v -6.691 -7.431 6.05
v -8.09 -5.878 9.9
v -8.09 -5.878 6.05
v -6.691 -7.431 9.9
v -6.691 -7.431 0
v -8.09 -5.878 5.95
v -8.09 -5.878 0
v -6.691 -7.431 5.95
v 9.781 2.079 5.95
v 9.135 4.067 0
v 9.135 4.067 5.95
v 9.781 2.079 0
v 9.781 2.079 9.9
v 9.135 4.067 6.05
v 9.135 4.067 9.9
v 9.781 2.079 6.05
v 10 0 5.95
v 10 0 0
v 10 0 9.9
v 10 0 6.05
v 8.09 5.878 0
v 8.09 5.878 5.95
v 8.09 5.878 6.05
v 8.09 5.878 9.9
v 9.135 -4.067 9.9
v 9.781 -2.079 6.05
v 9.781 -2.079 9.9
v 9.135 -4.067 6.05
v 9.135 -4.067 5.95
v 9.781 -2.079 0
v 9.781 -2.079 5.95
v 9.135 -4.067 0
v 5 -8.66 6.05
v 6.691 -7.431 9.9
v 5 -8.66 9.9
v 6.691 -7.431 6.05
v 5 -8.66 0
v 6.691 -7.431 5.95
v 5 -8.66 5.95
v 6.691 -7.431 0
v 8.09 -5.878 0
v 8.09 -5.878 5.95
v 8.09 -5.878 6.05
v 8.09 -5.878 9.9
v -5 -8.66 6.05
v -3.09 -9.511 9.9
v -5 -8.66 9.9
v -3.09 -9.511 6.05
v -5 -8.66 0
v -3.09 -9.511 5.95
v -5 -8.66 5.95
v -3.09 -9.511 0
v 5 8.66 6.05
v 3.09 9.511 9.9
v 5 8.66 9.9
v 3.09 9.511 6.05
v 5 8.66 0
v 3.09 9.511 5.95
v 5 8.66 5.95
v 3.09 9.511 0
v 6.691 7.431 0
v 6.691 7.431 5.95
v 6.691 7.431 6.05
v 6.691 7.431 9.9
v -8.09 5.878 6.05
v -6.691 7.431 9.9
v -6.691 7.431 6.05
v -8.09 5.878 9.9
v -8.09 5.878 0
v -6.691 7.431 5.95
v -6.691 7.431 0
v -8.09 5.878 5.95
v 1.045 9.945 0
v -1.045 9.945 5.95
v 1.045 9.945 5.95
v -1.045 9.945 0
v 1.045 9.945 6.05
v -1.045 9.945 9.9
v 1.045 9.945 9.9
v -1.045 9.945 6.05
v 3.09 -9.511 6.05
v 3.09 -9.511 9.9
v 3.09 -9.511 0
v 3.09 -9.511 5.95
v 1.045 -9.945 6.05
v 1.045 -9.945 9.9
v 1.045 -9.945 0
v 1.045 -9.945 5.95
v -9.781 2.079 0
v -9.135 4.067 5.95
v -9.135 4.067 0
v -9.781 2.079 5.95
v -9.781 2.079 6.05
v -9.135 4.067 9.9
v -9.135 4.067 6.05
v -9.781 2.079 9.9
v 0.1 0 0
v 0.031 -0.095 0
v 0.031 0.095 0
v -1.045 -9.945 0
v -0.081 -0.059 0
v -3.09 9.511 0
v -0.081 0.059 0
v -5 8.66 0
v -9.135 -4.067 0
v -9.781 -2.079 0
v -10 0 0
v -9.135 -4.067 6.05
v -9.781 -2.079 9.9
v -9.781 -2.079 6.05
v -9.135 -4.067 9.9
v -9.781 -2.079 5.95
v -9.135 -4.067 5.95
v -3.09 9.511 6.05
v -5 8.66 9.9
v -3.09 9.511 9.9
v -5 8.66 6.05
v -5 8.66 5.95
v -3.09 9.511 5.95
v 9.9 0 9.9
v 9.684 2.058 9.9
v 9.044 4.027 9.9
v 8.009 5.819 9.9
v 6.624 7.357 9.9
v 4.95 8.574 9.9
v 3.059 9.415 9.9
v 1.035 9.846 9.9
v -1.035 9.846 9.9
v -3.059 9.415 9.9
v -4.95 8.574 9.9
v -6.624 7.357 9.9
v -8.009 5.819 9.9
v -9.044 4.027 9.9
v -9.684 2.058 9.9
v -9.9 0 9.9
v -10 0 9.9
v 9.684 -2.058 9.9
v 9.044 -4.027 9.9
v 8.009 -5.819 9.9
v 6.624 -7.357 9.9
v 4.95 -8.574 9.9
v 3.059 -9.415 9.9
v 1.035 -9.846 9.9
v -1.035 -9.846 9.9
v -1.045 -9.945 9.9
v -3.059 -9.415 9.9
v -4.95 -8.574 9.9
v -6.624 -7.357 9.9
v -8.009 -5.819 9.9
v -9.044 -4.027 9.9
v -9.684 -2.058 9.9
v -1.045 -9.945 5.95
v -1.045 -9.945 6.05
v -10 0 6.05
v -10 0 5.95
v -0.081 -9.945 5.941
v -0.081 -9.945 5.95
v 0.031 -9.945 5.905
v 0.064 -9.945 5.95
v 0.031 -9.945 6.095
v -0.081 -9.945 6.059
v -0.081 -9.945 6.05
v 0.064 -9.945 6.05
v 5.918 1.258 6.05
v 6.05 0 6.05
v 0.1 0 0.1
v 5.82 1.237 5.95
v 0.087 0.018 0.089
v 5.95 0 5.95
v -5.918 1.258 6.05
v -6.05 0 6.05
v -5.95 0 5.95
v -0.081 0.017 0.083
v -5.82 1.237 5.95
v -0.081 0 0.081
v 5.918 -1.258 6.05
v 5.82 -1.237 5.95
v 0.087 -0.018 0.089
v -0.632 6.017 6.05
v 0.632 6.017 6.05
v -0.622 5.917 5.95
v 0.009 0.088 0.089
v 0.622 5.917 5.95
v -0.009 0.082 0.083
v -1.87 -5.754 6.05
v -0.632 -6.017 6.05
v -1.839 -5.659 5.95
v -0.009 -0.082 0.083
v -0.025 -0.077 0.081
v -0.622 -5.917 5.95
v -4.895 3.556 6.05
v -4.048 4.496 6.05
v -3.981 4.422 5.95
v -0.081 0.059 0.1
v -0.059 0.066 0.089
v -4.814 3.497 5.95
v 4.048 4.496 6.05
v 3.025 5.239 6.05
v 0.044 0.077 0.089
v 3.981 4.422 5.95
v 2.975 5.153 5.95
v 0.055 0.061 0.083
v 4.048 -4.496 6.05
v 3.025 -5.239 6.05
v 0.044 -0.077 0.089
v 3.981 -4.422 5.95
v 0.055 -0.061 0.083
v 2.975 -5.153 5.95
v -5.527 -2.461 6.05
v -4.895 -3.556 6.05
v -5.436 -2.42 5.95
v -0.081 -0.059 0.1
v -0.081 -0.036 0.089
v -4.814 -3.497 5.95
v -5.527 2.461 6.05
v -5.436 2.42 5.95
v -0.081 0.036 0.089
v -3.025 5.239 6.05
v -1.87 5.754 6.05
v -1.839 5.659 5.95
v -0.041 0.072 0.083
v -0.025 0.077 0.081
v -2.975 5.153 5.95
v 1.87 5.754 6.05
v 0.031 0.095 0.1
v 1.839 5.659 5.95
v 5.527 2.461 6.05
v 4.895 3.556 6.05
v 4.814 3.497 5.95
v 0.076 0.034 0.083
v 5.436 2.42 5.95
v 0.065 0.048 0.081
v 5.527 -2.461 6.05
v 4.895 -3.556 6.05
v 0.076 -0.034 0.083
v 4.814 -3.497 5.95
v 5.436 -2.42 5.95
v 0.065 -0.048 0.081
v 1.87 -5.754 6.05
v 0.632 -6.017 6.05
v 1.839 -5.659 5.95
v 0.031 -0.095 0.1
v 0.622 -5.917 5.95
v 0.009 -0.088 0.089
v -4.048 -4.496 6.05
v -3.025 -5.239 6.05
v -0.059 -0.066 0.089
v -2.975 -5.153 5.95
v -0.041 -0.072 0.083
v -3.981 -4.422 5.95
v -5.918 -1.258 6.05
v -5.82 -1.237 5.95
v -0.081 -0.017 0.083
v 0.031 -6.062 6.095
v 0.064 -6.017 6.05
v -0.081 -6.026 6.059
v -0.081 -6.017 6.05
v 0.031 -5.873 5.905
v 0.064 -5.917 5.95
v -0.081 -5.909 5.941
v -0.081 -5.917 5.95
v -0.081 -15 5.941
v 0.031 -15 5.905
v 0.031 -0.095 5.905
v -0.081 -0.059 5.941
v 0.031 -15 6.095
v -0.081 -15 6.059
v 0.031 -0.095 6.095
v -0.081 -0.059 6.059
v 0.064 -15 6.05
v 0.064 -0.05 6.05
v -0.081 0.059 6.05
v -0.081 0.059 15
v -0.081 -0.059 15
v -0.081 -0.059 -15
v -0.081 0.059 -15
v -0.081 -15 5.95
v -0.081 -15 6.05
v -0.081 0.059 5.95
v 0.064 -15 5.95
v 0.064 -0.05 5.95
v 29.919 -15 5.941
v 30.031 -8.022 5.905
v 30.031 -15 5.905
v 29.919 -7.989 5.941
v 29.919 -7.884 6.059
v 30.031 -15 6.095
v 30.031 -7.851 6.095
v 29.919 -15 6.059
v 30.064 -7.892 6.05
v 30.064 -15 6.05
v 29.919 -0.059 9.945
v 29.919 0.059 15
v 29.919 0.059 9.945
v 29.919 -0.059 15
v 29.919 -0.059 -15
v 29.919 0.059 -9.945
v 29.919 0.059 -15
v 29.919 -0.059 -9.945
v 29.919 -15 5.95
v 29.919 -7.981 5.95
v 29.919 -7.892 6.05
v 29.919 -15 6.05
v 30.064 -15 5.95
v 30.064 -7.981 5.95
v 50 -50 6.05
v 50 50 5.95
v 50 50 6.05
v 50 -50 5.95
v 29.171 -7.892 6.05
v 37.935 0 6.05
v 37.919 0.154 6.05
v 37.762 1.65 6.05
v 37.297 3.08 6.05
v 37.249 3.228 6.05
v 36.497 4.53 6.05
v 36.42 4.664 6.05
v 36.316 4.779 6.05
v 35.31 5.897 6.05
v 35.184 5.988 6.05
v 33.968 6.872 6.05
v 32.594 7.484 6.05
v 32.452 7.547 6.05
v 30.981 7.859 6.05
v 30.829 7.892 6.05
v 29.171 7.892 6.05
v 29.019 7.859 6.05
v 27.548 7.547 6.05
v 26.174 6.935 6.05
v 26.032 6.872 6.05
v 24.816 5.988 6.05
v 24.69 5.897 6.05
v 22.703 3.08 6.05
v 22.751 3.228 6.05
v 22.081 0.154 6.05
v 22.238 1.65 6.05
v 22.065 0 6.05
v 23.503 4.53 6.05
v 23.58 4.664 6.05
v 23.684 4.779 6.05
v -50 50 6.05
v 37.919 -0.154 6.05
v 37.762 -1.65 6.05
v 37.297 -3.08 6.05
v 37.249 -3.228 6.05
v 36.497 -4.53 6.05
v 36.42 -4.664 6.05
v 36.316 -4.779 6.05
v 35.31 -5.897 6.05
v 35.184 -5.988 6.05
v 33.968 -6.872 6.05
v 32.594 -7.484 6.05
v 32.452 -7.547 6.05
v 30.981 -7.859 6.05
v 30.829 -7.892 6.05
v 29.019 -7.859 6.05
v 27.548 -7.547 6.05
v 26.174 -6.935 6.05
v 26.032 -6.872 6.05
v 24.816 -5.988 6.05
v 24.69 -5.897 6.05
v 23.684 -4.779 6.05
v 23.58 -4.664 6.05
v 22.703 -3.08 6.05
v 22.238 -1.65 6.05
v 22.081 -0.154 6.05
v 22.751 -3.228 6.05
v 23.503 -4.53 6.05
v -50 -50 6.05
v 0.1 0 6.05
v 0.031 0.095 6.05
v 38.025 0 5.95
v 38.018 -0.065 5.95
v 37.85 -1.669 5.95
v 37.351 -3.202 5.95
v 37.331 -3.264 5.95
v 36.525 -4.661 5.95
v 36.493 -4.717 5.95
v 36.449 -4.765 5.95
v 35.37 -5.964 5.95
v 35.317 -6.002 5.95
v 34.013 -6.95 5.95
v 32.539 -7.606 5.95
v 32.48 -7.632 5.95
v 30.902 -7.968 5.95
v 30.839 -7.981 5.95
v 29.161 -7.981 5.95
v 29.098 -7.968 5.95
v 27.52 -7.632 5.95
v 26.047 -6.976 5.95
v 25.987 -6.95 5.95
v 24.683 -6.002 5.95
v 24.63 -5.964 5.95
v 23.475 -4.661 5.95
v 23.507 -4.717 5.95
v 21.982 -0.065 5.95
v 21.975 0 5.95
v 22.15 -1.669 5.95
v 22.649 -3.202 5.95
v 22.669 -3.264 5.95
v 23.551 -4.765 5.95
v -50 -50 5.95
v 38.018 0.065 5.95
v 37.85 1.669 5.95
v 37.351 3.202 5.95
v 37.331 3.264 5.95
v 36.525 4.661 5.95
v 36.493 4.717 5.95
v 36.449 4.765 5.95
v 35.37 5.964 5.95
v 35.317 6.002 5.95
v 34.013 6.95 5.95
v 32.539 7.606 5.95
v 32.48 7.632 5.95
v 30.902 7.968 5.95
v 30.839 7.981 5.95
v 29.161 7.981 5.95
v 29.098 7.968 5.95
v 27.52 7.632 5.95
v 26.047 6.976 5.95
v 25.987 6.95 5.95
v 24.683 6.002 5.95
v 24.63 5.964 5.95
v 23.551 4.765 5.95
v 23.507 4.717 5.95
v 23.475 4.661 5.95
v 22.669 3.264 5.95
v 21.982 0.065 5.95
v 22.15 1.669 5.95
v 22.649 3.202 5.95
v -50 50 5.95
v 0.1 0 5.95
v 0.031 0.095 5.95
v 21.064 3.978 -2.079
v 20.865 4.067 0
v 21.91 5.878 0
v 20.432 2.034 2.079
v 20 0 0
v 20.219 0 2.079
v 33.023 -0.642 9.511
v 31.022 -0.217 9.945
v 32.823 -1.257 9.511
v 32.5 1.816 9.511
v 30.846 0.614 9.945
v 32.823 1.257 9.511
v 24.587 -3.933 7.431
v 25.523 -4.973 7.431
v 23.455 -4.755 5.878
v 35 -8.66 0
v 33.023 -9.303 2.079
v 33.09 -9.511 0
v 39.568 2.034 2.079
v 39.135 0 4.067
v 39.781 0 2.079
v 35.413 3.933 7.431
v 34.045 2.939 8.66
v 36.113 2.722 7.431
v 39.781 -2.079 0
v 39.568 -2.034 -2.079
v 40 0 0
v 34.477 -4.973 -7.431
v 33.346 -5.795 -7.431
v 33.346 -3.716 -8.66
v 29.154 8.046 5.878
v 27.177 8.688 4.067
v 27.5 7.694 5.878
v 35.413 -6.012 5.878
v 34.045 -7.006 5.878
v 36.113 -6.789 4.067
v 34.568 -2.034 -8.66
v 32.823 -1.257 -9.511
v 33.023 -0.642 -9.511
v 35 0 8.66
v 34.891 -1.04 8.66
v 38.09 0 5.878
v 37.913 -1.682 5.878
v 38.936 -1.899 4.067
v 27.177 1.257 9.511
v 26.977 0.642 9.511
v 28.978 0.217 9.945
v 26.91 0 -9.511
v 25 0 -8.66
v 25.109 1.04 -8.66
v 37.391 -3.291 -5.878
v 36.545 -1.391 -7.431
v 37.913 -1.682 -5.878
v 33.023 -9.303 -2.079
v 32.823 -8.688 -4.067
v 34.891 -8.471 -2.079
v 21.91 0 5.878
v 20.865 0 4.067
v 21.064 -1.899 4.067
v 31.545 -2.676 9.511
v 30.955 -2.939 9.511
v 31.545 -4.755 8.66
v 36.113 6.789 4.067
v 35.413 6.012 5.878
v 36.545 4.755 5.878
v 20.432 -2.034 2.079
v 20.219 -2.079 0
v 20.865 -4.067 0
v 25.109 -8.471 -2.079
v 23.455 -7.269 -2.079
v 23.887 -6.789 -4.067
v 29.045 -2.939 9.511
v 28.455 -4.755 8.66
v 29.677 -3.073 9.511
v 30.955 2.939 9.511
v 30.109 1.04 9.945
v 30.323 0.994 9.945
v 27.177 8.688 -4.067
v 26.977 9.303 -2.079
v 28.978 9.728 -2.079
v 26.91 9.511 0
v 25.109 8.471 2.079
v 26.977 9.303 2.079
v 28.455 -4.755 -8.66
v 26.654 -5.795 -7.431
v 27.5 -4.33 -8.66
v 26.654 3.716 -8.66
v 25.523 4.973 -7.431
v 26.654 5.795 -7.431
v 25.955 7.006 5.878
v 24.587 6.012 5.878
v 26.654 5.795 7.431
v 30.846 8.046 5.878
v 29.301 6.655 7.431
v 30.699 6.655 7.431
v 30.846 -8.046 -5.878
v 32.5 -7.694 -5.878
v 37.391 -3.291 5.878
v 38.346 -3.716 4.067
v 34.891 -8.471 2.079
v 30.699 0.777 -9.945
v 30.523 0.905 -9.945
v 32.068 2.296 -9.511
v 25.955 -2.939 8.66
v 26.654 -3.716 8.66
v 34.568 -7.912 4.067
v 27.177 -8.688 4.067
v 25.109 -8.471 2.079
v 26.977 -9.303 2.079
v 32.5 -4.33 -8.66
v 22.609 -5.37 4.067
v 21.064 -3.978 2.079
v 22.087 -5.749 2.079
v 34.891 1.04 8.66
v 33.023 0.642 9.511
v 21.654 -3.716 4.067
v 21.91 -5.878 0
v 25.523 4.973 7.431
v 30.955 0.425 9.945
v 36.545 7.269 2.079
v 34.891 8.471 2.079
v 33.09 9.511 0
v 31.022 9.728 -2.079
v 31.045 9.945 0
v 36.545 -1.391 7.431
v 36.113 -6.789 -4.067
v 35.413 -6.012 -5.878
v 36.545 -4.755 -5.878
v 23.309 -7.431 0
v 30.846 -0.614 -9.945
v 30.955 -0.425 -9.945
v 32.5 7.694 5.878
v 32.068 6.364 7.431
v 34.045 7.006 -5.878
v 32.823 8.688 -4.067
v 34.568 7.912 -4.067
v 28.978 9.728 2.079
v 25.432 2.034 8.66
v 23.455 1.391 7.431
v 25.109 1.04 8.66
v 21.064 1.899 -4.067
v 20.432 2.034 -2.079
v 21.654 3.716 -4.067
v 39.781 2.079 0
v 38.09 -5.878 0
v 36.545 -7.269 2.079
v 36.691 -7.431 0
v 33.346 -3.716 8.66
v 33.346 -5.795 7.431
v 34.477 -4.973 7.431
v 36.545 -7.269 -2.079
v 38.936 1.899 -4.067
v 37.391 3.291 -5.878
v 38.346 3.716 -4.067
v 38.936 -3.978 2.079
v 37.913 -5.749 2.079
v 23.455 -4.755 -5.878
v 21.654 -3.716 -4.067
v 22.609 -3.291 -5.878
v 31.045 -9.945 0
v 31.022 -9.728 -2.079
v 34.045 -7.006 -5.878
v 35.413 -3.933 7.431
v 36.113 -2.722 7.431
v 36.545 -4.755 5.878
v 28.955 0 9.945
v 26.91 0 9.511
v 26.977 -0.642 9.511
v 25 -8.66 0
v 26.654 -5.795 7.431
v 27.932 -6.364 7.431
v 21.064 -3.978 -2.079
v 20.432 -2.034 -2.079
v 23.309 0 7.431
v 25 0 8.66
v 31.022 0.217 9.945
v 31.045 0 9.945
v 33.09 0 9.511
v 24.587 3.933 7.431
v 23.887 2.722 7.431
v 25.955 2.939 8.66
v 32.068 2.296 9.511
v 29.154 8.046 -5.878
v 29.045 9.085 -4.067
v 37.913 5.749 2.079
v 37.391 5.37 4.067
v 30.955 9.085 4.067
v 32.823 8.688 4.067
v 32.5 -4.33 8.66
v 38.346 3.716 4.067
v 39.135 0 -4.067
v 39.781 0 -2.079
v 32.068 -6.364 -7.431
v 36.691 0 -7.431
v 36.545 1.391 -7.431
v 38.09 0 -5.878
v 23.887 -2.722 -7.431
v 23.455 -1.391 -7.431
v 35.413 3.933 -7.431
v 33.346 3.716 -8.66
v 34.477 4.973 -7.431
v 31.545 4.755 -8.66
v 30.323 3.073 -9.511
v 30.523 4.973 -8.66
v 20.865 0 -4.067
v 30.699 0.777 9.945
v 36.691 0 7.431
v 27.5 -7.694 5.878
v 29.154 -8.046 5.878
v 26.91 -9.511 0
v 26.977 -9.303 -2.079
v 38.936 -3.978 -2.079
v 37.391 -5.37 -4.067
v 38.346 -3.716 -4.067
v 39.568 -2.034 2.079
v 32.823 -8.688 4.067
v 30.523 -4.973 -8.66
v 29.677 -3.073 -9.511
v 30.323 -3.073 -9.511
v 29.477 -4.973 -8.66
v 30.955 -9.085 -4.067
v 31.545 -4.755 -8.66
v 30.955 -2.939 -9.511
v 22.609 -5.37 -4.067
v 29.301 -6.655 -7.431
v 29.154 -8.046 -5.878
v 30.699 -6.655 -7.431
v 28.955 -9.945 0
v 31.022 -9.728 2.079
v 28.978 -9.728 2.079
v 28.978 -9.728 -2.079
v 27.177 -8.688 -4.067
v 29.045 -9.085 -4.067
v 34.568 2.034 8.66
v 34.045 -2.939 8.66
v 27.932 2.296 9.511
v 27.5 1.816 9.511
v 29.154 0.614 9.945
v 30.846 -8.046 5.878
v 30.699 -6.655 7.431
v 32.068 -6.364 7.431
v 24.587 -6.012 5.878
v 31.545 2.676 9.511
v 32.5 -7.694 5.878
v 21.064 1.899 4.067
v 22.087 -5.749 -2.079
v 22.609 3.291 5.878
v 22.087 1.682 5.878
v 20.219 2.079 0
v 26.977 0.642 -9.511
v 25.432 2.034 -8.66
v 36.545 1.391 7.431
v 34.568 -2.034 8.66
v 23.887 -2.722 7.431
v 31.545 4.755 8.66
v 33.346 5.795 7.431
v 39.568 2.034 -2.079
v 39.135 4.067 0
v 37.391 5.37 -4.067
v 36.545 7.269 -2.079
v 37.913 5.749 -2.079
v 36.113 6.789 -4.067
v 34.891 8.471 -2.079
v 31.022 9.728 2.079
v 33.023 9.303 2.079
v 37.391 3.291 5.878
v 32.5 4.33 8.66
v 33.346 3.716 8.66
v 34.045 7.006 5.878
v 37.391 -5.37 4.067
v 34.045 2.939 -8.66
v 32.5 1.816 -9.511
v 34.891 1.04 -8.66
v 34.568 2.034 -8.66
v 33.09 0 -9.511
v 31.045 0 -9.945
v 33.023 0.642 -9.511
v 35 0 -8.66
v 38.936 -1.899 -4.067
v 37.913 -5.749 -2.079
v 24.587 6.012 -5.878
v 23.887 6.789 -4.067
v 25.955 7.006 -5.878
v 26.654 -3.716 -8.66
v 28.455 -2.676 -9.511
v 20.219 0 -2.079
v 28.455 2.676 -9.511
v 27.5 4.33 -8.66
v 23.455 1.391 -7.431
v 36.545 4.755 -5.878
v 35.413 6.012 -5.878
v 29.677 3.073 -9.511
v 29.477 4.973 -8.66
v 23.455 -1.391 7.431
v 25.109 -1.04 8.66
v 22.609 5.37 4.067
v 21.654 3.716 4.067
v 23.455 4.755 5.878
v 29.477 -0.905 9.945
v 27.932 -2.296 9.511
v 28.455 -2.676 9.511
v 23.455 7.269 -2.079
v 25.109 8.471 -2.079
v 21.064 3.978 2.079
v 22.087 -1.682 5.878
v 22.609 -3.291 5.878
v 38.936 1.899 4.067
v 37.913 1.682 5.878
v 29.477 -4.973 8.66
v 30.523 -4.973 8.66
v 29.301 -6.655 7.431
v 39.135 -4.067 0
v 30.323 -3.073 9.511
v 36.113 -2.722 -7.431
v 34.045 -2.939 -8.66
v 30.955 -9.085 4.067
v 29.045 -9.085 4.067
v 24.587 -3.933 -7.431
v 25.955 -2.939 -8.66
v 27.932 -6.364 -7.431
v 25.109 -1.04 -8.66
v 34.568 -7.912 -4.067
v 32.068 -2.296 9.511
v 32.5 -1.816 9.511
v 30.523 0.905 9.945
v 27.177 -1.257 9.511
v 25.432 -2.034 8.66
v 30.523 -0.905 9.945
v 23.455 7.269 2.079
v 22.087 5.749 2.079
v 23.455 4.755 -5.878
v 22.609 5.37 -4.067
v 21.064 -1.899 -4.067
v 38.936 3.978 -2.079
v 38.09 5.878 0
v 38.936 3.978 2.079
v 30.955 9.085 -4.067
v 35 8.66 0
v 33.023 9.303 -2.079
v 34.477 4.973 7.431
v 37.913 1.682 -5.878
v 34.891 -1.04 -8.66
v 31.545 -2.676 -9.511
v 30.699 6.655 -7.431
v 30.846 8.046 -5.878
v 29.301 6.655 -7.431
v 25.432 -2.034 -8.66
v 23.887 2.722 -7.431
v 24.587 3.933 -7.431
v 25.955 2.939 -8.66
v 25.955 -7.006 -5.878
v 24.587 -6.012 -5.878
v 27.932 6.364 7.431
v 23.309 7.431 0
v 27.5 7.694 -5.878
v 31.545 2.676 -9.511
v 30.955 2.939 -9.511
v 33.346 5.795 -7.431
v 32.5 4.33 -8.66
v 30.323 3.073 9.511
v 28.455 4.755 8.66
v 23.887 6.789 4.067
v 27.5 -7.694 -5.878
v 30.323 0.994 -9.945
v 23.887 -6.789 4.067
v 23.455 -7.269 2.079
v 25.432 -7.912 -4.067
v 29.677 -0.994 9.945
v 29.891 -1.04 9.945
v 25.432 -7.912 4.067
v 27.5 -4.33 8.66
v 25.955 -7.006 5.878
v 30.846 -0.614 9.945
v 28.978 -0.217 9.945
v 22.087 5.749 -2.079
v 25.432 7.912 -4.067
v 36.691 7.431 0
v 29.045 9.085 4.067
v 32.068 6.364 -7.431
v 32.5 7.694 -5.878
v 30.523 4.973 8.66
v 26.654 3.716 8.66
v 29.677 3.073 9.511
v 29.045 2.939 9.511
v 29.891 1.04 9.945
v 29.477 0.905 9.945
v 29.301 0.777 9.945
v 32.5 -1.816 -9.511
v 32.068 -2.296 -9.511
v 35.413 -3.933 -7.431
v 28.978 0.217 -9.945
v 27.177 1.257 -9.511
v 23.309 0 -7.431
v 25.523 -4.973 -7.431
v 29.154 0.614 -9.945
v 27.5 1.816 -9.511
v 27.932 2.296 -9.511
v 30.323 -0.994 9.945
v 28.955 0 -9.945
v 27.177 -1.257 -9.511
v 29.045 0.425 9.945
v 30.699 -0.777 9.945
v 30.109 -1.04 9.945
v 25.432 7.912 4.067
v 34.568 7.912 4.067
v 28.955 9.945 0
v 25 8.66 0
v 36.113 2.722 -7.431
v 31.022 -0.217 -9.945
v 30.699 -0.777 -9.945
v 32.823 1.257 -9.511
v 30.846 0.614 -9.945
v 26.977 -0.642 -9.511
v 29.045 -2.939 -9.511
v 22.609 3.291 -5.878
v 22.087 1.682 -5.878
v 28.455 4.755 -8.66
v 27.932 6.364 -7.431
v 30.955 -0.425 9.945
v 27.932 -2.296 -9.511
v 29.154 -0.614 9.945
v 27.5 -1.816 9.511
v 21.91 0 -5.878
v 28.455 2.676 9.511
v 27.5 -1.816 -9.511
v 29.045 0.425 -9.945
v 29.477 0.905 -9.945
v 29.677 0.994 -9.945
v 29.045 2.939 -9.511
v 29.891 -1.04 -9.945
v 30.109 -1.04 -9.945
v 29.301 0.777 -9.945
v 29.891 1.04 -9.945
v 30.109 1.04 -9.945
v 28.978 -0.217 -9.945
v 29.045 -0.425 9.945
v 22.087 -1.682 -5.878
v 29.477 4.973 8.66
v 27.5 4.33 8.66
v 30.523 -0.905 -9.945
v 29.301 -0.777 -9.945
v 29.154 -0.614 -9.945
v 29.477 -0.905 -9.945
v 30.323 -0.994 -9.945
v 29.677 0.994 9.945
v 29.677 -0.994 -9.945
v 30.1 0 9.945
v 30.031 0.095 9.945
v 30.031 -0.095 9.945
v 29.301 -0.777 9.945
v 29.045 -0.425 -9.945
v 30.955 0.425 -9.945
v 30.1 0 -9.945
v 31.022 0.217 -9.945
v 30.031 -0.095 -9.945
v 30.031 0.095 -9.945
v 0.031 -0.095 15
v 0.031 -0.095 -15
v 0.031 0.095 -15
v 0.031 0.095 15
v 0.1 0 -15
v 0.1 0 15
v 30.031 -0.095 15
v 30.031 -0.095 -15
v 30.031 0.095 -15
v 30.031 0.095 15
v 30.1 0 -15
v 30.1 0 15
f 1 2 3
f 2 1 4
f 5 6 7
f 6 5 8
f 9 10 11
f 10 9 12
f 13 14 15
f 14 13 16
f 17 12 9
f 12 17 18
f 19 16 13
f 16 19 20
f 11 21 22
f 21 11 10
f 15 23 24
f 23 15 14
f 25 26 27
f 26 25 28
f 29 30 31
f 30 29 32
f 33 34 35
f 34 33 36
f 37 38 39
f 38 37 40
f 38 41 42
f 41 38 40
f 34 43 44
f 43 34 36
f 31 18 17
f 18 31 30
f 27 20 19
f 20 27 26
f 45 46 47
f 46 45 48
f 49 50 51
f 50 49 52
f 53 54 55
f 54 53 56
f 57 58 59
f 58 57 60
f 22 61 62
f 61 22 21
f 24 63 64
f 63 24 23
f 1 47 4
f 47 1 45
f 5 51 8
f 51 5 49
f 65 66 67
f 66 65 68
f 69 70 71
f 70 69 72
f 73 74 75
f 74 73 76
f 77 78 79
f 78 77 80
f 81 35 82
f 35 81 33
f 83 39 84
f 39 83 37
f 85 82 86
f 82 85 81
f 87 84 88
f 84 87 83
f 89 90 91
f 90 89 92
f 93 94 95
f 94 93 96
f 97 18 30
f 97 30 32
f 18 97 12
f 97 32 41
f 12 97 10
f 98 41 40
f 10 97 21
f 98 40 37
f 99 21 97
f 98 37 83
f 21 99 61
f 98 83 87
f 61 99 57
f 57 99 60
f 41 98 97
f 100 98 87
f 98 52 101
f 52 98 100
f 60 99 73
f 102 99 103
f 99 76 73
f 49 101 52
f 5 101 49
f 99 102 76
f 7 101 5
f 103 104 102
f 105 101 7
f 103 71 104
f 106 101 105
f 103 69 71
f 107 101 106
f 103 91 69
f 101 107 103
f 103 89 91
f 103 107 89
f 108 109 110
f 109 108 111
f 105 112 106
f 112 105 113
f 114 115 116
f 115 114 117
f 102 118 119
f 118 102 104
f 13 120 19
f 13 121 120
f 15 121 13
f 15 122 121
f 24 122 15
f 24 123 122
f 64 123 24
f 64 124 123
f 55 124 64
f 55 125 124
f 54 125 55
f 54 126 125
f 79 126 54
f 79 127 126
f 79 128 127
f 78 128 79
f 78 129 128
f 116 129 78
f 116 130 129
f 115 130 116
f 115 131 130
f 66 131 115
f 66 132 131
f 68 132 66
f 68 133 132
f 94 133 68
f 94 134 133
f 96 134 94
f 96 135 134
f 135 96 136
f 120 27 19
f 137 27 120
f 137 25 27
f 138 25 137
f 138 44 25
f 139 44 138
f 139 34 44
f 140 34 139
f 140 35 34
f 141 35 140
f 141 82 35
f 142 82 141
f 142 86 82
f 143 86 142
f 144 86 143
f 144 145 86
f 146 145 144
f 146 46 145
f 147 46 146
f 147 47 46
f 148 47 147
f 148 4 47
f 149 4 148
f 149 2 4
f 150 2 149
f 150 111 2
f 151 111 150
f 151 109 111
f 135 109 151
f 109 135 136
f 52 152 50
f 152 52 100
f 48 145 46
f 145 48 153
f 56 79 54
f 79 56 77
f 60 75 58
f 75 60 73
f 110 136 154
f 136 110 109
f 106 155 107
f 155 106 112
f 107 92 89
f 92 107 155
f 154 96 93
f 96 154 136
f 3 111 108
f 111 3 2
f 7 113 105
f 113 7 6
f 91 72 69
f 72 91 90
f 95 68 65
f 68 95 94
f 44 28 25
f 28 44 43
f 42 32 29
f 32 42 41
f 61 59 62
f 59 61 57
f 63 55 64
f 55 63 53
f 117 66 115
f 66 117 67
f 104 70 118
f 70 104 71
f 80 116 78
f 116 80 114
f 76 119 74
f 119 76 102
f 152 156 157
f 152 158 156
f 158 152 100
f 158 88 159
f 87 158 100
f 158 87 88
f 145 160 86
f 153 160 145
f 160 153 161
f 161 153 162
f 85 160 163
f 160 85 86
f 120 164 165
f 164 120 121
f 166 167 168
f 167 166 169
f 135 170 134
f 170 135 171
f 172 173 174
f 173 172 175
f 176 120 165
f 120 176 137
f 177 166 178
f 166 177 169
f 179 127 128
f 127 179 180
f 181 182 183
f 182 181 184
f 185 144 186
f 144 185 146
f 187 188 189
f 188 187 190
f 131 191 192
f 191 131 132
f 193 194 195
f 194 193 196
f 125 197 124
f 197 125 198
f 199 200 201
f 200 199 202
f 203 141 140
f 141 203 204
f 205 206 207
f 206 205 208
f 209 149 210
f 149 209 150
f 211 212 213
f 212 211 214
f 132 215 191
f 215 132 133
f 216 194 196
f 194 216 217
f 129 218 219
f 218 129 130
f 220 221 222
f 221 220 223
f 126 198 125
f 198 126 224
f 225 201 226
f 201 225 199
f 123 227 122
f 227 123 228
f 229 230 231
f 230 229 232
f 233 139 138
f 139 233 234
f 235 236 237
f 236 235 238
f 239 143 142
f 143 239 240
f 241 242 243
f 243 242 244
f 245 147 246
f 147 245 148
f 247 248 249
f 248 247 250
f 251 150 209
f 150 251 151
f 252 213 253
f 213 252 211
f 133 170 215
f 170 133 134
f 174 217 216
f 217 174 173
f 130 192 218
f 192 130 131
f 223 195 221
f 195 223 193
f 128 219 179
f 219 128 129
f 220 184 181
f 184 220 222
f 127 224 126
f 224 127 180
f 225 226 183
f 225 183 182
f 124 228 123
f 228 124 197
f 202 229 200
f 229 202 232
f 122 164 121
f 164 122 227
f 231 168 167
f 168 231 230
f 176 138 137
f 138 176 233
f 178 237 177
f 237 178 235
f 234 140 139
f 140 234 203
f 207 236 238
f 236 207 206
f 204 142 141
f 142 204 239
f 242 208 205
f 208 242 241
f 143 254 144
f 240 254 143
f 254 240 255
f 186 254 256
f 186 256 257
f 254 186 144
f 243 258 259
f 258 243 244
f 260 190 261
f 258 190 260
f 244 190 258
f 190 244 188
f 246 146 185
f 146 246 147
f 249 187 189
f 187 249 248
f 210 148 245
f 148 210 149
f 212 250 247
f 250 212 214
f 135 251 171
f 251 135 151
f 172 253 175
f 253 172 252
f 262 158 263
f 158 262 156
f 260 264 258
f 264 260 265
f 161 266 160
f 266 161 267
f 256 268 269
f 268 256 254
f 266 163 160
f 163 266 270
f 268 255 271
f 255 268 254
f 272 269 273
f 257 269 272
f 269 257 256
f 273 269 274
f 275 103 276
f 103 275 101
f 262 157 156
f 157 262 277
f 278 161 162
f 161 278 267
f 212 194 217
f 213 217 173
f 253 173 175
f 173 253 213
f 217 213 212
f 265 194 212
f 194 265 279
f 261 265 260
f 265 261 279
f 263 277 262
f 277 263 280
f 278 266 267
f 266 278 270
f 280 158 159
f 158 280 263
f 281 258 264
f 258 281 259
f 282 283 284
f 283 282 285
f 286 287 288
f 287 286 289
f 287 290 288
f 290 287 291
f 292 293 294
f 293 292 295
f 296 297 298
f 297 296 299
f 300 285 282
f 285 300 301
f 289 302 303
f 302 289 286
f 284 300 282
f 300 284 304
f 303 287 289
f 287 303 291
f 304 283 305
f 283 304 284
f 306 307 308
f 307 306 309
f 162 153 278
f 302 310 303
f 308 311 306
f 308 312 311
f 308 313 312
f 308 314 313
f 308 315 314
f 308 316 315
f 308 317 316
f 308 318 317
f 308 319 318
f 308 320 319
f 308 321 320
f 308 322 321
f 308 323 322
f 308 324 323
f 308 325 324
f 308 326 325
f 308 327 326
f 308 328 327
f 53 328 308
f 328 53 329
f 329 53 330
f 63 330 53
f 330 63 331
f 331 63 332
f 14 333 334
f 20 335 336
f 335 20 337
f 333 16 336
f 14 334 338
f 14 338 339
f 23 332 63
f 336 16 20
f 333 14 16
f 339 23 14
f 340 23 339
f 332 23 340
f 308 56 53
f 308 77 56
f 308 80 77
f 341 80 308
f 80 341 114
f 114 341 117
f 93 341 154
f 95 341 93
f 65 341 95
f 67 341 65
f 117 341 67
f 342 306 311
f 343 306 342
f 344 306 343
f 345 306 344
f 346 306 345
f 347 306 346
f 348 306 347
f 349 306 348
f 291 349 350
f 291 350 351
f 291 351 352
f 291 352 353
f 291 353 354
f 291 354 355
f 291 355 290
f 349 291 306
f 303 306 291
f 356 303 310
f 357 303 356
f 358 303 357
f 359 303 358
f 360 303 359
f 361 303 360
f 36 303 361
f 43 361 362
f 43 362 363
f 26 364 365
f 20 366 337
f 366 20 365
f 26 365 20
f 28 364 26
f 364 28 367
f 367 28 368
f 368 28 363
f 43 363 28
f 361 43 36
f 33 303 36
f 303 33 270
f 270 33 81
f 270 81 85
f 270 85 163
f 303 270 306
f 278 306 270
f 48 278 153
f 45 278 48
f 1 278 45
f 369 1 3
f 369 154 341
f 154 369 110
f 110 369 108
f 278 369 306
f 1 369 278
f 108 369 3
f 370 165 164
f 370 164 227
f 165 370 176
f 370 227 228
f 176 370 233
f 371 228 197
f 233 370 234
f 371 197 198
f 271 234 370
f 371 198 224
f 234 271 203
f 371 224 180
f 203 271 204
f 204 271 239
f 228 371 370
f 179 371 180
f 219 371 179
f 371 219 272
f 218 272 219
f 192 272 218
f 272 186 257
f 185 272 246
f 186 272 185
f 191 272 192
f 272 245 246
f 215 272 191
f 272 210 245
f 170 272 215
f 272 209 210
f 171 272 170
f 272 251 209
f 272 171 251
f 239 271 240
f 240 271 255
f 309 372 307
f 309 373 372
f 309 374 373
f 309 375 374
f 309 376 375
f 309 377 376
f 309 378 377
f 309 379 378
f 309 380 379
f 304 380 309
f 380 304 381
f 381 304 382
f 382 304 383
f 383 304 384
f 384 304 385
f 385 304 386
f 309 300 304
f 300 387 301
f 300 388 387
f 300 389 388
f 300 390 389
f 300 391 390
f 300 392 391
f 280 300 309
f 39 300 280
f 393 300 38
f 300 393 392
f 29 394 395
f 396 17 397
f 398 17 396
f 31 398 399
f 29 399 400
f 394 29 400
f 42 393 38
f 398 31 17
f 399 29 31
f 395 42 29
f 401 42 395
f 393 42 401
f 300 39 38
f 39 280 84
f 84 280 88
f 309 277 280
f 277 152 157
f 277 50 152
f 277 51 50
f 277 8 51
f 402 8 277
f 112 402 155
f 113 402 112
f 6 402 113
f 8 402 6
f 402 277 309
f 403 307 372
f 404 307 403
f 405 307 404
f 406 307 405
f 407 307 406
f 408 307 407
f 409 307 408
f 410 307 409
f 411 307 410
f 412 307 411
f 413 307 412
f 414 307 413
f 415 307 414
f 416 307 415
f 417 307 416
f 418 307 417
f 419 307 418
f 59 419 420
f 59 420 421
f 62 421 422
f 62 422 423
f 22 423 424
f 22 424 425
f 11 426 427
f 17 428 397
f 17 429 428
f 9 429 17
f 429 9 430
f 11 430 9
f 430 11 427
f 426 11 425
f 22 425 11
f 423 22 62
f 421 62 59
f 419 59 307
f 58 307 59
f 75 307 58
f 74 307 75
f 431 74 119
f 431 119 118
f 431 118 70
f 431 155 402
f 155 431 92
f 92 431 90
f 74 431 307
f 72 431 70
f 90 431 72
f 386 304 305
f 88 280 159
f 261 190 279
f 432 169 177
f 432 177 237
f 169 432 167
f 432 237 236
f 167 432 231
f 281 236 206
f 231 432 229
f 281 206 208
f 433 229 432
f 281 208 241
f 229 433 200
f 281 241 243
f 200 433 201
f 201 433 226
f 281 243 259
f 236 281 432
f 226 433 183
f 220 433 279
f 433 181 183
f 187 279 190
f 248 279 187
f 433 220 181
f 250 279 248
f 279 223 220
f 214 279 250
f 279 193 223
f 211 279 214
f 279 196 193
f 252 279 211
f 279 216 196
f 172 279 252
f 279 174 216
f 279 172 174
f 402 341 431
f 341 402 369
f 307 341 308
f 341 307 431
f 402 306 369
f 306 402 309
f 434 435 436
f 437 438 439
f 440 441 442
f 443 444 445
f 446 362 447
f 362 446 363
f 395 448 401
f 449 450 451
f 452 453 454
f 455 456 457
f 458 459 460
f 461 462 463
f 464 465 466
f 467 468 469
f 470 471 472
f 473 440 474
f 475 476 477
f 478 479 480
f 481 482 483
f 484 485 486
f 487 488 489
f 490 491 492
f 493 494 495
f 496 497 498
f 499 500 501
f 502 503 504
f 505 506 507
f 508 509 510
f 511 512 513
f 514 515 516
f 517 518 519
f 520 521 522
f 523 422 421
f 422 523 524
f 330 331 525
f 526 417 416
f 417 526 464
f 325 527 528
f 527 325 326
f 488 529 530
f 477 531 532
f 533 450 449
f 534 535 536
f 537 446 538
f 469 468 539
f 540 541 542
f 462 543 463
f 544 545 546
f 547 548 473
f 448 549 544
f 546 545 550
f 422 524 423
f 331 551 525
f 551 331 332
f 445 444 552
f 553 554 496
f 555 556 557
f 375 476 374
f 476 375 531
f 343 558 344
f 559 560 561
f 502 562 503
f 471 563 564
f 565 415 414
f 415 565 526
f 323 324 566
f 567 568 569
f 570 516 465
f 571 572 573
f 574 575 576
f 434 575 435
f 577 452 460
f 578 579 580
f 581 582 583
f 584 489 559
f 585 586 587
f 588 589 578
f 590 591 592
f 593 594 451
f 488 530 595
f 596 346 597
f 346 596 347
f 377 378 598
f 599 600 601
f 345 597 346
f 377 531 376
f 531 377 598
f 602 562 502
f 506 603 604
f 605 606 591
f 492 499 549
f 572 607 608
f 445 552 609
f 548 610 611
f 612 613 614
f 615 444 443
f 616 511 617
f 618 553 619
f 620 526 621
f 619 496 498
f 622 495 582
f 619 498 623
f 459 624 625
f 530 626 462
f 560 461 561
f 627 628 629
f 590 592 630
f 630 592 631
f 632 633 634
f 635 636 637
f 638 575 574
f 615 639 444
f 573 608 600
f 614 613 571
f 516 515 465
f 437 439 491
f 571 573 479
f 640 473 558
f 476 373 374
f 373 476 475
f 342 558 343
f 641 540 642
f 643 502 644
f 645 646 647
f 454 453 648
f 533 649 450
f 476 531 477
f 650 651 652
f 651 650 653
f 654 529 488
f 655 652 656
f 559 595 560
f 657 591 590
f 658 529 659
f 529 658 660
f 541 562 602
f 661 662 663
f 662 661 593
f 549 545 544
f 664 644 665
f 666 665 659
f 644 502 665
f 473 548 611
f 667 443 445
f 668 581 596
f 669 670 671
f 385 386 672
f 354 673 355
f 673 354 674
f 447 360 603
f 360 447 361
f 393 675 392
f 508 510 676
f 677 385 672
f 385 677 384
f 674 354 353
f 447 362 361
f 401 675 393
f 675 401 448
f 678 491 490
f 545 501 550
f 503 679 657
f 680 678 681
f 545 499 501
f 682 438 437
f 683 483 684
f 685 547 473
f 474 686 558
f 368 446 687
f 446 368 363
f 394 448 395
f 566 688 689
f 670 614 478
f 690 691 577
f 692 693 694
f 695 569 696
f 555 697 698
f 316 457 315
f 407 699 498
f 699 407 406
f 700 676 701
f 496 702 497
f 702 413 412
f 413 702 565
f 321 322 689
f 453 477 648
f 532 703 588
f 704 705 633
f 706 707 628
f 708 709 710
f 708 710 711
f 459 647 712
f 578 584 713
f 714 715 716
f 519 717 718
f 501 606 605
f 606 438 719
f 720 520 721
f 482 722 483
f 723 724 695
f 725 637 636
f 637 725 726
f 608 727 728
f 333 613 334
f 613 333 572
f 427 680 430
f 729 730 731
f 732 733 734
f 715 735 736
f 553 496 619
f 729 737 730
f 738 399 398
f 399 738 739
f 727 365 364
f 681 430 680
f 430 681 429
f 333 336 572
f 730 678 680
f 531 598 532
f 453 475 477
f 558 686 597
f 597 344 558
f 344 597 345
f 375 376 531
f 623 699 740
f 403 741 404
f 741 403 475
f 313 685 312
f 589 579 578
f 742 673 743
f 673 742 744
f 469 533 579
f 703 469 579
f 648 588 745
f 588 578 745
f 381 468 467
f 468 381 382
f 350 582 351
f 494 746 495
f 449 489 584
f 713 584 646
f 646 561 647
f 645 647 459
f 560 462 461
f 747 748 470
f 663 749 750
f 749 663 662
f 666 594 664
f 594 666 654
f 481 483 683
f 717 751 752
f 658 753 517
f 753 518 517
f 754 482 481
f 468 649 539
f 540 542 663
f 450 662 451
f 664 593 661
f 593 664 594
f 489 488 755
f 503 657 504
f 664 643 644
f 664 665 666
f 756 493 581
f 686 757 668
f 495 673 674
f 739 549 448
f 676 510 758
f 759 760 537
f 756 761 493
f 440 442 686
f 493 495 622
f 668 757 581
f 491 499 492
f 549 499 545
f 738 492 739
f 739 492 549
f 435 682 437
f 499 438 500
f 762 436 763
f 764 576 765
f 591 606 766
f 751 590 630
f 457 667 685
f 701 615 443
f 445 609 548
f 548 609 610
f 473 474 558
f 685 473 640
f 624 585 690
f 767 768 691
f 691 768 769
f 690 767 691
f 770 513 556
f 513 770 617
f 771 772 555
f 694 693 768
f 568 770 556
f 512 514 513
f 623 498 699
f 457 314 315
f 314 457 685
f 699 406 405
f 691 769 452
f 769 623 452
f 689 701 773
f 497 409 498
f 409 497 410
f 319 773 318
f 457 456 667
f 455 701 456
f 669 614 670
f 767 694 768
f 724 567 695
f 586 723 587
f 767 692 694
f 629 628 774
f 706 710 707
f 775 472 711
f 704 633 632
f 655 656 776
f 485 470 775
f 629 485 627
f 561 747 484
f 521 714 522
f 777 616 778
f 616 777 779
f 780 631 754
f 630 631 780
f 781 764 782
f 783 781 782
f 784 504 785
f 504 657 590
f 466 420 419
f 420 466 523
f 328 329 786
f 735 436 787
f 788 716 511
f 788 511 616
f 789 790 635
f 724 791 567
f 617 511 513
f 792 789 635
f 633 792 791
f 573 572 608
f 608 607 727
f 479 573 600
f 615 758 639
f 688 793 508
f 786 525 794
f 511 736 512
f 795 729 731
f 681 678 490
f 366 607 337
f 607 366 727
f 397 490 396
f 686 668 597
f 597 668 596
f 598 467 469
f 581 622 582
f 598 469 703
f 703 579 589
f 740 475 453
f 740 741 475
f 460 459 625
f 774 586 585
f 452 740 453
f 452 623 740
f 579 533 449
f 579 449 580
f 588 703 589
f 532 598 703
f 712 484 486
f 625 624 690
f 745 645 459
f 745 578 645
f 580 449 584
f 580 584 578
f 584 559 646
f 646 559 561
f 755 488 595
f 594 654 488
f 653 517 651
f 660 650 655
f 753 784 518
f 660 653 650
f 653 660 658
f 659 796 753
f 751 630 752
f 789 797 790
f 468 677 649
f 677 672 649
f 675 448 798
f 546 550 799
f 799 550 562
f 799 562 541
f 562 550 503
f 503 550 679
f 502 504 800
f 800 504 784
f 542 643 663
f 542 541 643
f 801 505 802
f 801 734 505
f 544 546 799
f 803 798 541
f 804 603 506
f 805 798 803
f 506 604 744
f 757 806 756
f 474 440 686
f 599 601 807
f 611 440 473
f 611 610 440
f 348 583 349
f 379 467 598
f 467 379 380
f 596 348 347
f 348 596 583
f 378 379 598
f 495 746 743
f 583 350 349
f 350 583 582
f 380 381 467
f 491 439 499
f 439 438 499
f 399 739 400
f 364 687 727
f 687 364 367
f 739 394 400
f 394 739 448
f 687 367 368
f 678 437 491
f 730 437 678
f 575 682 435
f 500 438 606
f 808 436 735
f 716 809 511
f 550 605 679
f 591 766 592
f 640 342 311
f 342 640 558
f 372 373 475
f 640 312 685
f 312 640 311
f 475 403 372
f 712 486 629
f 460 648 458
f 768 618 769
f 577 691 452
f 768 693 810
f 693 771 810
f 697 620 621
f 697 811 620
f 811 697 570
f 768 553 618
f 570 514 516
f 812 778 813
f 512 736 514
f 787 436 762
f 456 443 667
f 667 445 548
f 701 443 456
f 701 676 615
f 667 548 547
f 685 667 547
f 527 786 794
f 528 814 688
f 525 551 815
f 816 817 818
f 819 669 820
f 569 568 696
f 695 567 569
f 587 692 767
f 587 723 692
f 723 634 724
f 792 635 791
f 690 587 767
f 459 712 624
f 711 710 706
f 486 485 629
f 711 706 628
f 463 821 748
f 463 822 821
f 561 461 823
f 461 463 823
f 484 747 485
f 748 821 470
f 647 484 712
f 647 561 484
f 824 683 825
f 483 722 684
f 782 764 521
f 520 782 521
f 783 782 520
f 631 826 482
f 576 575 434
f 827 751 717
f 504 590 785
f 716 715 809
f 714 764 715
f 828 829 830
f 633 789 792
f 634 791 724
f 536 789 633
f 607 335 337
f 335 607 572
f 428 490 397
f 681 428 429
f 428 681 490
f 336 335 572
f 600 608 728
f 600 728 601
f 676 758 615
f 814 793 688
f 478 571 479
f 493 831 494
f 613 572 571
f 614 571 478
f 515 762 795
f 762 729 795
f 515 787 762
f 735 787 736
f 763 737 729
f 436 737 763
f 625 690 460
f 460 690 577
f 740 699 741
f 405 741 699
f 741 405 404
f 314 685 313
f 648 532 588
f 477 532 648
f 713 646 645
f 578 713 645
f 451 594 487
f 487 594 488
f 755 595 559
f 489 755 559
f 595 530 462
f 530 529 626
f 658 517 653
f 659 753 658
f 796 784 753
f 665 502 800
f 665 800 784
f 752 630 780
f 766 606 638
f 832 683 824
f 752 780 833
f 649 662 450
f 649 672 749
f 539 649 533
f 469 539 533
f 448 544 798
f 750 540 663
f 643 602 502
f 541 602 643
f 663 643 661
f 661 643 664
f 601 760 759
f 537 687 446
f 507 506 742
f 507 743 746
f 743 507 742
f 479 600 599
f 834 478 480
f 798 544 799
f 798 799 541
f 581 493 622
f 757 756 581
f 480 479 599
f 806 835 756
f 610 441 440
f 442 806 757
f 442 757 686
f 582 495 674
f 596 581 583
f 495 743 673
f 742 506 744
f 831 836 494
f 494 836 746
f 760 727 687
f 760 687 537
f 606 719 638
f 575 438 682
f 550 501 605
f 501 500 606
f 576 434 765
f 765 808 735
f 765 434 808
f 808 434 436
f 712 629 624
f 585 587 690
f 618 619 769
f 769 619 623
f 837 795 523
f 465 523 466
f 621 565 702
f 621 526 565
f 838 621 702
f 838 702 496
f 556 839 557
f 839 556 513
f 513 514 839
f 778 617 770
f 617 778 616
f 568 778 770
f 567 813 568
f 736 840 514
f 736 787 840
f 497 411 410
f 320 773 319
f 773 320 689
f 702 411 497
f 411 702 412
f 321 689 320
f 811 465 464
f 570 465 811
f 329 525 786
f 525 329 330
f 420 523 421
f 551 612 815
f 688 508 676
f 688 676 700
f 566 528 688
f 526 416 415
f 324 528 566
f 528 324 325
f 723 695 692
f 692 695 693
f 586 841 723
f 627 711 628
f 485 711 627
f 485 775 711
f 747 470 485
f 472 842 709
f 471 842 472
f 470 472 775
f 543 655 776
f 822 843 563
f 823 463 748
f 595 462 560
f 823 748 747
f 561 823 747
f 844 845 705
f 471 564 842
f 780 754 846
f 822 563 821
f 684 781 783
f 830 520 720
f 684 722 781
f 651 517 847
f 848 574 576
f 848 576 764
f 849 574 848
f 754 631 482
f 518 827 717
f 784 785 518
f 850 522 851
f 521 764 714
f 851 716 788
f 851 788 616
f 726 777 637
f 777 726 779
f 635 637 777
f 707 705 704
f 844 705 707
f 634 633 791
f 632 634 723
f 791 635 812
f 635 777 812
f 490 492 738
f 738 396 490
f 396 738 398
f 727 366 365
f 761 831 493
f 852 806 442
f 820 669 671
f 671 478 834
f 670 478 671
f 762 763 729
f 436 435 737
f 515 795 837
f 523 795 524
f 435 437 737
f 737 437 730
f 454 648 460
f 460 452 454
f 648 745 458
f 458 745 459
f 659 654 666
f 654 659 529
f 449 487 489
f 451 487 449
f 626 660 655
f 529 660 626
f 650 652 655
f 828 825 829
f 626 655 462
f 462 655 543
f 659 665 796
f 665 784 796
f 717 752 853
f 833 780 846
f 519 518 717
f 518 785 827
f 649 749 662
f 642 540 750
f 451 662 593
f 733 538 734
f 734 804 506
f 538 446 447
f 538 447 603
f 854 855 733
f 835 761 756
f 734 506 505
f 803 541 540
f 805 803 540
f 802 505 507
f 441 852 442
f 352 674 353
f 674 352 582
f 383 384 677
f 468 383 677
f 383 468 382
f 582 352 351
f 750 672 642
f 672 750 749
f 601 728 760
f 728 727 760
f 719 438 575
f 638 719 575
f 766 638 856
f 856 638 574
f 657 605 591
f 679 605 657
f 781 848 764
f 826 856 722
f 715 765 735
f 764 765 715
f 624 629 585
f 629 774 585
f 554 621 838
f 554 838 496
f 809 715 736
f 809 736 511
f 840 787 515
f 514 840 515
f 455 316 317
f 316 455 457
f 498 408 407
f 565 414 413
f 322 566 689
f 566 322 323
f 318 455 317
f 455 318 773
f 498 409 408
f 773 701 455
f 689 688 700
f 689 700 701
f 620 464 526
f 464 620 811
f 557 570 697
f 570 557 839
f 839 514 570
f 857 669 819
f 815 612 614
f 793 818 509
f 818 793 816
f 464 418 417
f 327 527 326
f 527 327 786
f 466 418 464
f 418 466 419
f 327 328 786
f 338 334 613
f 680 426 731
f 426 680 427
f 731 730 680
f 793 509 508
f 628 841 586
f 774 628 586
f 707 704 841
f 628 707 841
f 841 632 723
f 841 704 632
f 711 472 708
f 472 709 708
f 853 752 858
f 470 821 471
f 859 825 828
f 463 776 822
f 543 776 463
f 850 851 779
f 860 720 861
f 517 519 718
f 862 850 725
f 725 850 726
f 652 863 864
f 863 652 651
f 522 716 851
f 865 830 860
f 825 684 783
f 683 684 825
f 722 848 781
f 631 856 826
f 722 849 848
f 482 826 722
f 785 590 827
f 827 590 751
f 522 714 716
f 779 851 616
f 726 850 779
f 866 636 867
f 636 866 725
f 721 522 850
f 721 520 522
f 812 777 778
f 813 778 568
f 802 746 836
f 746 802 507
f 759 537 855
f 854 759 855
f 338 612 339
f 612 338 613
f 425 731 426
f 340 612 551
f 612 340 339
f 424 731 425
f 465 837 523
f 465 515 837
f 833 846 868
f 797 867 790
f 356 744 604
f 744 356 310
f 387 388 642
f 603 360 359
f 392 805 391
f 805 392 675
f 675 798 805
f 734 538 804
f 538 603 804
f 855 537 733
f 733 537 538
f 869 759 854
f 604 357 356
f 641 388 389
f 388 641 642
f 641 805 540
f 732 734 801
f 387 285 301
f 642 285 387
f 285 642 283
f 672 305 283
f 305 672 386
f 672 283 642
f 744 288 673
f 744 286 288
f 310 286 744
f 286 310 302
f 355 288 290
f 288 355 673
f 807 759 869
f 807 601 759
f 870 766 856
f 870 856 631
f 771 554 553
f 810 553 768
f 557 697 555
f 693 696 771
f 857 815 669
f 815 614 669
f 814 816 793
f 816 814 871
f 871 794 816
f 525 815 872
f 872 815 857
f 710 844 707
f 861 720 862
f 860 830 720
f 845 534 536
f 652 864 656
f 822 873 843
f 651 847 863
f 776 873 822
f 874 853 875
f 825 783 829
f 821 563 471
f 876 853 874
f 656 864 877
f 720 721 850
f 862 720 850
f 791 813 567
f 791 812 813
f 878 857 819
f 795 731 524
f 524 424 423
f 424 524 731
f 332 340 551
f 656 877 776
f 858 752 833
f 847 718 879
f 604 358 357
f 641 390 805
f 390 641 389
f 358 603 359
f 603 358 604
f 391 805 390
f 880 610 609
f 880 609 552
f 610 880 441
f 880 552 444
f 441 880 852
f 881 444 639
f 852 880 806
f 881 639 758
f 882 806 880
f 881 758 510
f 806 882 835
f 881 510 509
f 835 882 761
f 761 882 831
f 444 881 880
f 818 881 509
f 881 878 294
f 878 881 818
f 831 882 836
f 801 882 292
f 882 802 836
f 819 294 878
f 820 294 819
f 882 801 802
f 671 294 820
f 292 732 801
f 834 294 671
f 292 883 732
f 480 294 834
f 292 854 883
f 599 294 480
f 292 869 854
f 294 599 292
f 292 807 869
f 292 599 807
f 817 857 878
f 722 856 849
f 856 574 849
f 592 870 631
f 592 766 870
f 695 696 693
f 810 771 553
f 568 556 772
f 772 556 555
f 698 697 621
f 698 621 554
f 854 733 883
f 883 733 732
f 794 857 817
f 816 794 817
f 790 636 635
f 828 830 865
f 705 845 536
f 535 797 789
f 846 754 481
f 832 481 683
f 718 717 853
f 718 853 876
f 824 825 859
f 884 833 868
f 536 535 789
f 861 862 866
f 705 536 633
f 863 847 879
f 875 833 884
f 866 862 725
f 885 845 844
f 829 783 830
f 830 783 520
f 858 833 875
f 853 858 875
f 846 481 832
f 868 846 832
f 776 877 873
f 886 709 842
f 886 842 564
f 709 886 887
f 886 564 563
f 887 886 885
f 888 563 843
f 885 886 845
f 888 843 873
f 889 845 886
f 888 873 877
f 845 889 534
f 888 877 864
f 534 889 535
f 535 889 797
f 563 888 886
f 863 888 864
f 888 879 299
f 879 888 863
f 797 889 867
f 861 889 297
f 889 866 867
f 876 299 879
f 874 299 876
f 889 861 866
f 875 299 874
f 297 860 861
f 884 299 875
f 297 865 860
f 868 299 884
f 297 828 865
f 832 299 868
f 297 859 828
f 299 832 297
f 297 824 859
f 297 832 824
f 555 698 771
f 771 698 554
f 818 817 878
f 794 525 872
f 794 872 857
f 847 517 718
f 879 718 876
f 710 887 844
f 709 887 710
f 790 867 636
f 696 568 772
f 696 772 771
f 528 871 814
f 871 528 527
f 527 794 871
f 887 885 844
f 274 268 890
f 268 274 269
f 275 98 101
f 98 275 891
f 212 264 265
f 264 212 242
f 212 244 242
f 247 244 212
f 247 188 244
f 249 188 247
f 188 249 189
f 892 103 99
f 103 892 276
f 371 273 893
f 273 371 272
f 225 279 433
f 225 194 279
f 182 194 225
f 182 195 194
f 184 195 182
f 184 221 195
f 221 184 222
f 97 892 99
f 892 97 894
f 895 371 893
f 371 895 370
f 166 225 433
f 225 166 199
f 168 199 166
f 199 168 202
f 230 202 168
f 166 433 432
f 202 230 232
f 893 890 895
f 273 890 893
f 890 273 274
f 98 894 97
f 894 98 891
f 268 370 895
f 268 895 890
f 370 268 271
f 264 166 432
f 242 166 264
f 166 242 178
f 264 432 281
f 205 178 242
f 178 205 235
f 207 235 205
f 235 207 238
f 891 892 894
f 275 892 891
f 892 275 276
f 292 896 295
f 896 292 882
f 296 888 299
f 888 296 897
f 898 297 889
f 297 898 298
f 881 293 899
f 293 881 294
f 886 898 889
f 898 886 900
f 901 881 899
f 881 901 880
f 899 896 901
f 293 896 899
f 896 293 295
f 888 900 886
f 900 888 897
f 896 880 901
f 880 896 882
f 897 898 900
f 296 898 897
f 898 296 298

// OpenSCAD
color([1,0,0], 0.3)
translate([30,0,0])
sphere(r=10);

color([0,0,0])
translate([0,0,-15])
cylinder(30, 0.1, 0.1);

color([0,0,0])
translate([30,0,-15])
cylinder(30, 0.1, 0.1);

difference() {

color([0,1,0], 0.3)
cylinder(9.9, 10, 10);

color([0,0,1], 0.5)
cylinder(10, 0, 10);
}

translate([0,0,6]) {
color([0,0,0])
rotate([90,0,0])
cylinder(15, 0.1, 0.1);
    
color([0,0,0])
translate([30,0,0])
rotate([90,0,0])
cylinder(15, 0.1, 0.1);

color([1,1,1], 0.5)
cube([100, 100, 0.1], center=true);
}
